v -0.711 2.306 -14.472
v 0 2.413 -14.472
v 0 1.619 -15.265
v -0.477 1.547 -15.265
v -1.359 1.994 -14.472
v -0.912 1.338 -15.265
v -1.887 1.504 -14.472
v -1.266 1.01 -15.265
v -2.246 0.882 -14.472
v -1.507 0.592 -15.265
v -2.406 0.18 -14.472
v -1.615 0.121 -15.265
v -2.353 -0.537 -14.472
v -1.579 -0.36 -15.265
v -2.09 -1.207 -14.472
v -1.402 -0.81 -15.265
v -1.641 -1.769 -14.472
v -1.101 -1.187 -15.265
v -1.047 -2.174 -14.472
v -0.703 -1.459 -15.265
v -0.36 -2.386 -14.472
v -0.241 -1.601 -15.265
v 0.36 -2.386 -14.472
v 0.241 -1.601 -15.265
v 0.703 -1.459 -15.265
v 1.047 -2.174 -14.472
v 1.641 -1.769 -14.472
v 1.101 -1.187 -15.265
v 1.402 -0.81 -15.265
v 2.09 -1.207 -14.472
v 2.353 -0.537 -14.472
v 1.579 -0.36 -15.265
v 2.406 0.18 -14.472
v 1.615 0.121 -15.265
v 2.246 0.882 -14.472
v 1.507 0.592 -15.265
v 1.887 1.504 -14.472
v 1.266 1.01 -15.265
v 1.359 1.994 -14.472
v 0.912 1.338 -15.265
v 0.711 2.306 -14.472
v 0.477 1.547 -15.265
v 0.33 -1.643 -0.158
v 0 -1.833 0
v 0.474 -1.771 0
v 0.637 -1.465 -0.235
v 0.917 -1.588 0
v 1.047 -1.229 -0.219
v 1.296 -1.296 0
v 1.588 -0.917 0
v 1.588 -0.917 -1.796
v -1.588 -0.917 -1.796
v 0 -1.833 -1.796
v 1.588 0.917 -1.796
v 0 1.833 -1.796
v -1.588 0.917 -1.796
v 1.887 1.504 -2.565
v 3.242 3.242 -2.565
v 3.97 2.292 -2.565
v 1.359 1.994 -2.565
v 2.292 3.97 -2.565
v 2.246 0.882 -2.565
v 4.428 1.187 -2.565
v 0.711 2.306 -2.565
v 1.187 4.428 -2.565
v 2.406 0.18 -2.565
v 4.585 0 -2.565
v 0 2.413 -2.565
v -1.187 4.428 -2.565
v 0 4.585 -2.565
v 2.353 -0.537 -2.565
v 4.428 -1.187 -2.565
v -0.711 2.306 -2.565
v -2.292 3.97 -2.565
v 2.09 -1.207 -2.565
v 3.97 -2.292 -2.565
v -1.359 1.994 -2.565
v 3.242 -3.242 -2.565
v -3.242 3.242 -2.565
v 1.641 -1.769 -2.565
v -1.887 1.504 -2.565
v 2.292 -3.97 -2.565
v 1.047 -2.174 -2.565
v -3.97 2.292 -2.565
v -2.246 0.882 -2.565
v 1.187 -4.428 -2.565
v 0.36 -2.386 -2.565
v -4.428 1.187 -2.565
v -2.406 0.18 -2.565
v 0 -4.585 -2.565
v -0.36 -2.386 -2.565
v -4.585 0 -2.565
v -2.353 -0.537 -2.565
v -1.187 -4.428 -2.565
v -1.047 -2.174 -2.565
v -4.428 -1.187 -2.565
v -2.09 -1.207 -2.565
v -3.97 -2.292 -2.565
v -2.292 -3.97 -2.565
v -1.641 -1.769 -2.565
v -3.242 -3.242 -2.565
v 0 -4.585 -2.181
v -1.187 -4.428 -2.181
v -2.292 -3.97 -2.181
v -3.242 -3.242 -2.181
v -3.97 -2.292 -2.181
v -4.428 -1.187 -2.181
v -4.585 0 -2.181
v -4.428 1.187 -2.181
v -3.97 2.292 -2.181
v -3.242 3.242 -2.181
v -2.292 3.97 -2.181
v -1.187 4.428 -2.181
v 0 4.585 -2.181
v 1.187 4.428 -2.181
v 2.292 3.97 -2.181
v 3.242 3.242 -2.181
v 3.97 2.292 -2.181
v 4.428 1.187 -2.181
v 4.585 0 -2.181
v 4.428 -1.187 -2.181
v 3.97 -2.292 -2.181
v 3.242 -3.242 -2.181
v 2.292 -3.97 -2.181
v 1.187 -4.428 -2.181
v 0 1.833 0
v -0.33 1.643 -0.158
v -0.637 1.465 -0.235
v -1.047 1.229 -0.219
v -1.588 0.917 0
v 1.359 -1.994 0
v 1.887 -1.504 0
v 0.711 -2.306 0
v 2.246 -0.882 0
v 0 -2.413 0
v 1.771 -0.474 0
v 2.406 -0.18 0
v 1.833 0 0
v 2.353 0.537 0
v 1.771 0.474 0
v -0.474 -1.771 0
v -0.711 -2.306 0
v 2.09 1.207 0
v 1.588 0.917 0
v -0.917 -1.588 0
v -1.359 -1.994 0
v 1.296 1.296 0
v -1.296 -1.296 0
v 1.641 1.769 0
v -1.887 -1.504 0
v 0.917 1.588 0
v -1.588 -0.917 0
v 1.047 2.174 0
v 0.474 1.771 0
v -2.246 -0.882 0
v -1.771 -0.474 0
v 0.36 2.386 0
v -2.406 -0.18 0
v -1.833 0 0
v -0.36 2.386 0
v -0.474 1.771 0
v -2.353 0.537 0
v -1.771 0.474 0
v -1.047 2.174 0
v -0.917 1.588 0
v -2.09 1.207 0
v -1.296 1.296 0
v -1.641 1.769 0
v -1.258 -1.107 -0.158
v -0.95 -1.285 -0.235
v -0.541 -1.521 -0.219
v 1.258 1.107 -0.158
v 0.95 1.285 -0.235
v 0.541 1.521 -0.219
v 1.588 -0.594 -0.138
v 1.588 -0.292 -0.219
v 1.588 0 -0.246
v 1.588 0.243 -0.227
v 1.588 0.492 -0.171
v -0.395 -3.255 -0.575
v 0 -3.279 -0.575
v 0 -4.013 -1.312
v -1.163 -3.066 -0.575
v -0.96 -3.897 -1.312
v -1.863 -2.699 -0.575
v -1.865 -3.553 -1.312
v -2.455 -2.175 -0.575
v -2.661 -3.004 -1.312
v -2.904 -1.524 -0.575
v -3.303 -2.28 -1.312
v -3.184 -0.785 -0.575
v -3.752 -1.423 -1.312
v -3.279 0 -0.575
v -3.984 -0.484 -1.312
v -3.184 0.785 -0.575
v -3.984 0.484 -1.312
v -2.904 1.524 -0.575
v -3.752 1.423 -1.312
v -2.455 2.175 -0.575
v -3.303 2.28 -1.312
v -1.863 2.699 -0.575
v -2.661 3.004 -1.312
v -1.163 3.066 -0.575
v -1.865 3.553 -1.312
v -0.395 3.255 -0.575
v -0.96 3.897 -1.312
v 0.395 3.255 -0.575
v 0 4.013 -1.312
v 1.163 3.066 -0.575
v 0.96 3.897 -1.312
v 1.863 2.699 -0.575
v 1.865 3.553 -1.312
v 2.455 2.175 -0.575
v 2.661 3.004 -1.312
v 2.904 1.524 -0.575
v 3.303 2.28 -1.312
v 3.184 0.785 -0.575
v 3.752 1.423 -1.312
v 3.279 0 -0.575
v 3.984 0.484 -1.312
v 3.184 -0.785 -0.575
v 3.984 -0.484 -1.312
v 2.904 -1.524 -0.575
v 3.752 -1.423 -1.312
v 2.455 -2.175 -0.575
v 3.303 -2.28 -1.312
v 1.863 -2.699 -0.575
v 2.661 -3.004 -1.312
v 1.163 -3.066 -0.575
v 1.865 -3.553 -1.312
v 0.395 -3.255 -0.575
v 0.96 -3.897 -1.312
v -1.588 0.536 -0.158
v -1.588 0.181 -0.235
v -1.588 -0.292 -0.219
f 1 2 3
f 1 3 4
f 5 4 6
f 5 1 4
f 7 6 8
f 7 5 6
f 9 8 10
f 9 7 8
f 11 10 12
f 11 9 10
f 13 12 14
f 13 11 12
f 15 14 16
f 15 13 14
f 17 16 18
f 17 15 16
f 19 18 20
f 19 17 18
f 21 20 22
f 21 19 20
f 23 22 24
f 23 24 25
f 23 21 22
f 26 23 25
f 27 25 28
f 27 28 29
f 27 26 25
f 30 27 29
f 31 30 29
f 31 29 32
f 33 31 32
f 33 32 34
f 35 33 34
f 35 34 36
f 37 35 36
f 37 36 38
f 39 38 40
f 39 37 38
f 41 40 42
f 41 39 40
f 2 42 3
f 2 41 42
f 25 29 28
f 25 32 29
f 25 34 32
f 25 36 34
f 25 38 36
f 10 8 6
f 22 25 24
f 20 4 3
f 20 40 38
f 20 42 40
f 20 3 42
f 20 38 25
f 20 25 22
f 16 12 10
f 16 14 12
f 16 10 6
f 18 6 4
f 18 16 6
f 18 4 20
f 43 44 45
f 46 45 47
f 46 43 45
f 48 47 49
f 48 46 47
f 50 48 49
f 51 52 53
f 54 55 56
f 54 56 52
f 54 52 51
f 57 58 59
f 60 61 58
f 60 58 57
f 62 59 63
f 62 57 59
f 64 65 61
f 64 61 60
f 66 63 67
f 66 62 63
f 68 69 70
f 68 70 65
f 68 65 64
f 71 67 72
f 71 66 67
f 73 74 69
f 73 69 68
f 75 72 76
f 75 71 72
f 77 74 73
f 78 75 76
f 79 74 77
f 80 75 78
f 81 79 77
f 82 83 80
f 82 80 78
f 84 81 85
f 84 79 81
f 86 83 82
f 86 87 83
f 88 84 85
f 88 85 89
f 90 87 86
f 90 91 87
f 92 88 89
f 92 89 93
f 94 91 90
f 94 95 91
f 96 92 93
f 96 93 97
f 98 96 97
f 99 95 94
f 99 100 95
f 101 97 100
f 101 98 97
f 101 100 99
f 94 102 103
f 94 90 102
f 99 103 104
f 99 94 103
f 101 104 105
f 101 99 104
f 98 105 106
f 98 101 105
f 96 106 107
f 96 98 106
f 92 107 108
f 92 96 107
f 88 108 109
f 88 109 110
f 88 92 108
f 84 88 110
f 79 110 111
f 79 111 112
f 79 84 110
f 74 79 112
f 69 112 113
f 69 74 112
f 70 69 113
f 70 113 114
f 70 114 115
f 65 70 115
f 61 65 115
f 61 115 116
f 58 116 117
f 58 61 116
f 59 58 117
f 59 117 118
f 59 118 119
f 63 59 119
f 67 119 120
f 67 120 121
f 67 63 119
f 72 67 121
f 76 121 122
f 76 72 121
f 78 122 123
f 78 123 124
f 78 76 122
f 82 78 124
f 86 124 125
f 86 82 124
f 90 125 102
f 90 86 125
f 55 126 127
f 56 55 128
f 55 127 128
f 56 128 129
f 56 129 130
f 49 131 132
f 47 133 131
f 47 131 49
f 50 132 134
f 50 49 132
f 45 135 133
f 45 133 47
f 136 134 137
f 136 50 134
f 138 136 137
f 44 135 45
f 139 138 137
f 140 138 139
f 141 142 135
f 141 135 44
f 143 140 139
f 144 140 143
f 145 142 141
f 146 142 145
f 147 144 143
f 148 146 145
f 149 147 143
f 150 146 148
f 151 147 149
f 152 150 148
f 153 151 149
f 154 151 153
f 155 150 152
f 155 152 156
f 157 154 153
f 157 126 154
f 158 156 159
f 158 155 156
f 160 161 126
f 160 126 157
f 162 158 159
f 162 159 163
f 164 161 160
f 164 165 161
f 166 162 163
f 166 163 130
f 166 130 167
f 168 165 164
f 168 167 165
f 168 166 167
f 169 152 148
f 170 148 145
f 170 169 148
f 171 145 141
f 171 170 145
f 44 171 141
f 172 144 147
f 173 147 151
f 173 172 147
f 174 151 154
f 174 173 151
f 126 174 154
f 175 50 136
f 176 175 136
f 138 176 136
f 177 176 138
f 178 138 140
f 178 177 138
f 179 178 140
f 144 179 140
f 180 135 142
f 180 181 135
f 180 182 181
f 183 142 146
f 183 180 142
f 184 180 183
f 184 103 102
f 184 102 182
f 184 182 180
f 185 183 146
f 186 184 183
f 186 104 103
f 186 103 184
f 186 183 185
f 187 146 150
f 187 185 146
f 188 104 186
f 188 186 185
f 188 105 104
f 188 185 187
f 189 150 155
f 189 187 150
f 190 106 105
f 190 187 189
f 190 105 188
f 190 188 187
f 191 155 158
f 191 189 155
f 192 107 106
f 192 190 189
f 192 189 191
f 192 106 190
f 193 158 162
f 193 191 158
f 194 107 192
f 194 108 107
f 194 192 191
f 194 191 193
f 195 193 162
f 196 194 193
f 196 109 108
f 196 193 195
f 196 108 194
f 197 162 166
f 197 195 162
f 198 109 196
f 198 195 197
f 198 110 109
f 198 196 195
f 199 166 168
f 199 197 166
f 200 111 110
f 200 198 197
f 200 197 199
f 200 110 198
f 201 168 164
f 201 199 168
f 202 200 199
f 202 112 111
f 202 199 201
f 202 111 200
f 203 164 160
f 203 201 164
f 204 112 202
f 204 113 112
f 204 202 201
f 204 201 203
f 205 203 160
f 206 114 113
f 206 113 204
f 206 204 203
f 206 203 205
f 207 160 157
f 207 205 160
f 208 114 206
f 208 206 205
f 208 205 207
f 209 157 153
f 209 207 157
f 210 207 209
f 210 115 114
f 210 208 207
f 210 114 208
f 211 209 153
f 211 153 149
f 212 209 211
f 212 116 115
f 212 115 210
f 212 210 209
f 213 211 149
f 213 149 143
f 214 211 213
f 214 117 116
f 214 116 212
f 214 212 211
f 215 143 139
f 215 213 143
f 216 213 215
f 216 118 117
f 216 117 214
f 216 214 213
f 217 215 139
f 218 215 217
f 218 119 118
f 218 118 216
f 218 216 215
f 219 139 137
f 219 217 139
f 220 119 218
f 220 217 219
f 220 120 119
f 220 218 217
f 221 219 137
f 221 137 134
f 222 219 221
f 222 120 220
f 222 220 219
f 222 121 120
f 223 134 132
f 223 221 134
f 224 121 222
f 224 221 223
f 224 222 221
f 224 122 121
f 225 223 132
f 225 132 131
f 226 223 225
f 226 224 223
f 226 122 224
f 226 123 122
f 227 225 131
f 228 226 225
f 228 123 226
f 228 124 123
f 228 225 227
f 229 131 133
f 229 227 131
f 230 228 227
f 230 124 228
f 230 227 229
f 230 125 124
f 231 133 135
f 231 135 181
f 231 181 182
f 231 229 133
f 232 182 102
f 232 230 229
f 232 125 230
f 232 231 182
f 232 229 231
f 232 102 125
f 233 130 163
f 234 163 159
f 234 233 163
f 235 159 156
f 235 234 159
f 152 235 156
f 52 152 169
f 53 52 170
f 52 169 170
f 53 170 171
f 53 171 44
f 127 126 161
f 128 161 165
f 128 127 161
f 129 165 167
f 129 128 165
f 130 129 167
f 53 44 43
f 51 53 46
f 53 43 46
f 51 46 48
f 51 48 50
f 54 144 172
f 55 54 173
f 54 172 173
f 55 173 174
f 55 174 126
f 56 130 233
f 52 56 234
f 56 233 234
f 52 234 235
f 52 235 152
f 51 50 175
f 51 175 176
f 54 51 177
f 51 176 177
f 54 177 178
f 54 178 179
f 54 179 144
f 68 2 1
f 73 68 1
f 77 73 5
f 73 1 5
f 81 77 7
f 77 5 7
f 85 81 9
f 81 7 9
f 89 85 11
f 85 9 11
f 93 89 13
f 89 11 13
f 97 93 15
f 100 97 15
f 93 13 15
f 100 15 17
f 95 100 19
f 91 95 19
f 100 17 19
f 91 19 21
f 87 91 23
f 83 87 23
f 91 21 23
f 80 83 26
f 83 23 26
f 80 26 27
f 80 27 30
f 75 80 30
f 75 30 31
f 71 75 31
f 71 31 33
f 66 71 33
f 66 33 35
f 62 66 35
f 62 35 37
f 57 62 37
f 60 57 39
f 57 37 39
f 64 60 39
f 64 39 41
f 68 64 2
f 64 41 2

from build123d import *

# Parameters (mm, degrees)
SKETCH1_W          = 12.7
SKETCH1_H          = 2.413
CHAMFER1_SIZE      = 0.79375
CUT_EXTRUDE2_DEPTH = 1.79578
SKETCH6_R          = 1.833087105
CUT_EXTRUDE3_DEPTH = 1.79578
CUT_EXTRUDE3_TAPER = 45


with BuildPart() as part:
    # Sketch1 → Revolve1 (revolve)
    with BuildSketch(Plane(origin=(0, 0, 0), x_dir=(0, 0, -1), z_dir=(1, 0, 0))):
        with Locations((8.9154, 1.2065)):
            Rectangle(SKETCH1_W, SKETCH1_H)
    revolve(axis=Axis((0, 0, -15.2654), (0, 0, 1)))

    # Chamfer1
    chamfer1_edges = [part.edges().sort_by_distance(p)[0] for p in [
        (0, -2.413, -15.2654),
    ]]
    chamfer(chamfer1_edges, length=CHAMFER1_SIZE)

    # Sketch7 → Revolve2 (revolve)
    with BuildSketch(Plane(origin=(0, 0, 0), x_dir=(0, 0, -1), z_dir=(1, 0, 0))):
        with BuildLine():
            Line((2.18059, 4.5847), (2.5654, 4.5847))
            Line((2.5654, 4.5847), (2.5654, 0))
            Line((2.5654, 0), (0, 0))
            Line((0, 0), (0, 2.413))
            ThreePointArc((0, 2.413), (0.925030326, 3.664791196), (2.18059, 4.5847))
        make_face()
    revolve(axis=Axis((0, 0, 0), (0, 0, -1)))

    # Sketch5 → Cut-Extrude2 (cut)
    with BuildSketch(Plane.XY):
        Polygon((1.5875, -0.916543552), (1.5875, 0.916543552), (0, 1.833087105), (-1.5875, 0.916543552), (-1.5875, -0.916543552), (0, -1.833087105), align=None)
    extrude(amount=-CUT_EXTRUDE2_DEPTH, mode=Mode.SUBTRACT)

    # Sketch6 → Cut-Extrude3 (cut)
    with BuildSketch(Plane.XY):
        Circle(SKETCH6_R)
    extrude(amount=-CUT_EXTRUDE3_DEPTH, taper=CUT_EXTRUDE3_TAPER, mode=Mode.SUBTRACT)


solid = part.part
